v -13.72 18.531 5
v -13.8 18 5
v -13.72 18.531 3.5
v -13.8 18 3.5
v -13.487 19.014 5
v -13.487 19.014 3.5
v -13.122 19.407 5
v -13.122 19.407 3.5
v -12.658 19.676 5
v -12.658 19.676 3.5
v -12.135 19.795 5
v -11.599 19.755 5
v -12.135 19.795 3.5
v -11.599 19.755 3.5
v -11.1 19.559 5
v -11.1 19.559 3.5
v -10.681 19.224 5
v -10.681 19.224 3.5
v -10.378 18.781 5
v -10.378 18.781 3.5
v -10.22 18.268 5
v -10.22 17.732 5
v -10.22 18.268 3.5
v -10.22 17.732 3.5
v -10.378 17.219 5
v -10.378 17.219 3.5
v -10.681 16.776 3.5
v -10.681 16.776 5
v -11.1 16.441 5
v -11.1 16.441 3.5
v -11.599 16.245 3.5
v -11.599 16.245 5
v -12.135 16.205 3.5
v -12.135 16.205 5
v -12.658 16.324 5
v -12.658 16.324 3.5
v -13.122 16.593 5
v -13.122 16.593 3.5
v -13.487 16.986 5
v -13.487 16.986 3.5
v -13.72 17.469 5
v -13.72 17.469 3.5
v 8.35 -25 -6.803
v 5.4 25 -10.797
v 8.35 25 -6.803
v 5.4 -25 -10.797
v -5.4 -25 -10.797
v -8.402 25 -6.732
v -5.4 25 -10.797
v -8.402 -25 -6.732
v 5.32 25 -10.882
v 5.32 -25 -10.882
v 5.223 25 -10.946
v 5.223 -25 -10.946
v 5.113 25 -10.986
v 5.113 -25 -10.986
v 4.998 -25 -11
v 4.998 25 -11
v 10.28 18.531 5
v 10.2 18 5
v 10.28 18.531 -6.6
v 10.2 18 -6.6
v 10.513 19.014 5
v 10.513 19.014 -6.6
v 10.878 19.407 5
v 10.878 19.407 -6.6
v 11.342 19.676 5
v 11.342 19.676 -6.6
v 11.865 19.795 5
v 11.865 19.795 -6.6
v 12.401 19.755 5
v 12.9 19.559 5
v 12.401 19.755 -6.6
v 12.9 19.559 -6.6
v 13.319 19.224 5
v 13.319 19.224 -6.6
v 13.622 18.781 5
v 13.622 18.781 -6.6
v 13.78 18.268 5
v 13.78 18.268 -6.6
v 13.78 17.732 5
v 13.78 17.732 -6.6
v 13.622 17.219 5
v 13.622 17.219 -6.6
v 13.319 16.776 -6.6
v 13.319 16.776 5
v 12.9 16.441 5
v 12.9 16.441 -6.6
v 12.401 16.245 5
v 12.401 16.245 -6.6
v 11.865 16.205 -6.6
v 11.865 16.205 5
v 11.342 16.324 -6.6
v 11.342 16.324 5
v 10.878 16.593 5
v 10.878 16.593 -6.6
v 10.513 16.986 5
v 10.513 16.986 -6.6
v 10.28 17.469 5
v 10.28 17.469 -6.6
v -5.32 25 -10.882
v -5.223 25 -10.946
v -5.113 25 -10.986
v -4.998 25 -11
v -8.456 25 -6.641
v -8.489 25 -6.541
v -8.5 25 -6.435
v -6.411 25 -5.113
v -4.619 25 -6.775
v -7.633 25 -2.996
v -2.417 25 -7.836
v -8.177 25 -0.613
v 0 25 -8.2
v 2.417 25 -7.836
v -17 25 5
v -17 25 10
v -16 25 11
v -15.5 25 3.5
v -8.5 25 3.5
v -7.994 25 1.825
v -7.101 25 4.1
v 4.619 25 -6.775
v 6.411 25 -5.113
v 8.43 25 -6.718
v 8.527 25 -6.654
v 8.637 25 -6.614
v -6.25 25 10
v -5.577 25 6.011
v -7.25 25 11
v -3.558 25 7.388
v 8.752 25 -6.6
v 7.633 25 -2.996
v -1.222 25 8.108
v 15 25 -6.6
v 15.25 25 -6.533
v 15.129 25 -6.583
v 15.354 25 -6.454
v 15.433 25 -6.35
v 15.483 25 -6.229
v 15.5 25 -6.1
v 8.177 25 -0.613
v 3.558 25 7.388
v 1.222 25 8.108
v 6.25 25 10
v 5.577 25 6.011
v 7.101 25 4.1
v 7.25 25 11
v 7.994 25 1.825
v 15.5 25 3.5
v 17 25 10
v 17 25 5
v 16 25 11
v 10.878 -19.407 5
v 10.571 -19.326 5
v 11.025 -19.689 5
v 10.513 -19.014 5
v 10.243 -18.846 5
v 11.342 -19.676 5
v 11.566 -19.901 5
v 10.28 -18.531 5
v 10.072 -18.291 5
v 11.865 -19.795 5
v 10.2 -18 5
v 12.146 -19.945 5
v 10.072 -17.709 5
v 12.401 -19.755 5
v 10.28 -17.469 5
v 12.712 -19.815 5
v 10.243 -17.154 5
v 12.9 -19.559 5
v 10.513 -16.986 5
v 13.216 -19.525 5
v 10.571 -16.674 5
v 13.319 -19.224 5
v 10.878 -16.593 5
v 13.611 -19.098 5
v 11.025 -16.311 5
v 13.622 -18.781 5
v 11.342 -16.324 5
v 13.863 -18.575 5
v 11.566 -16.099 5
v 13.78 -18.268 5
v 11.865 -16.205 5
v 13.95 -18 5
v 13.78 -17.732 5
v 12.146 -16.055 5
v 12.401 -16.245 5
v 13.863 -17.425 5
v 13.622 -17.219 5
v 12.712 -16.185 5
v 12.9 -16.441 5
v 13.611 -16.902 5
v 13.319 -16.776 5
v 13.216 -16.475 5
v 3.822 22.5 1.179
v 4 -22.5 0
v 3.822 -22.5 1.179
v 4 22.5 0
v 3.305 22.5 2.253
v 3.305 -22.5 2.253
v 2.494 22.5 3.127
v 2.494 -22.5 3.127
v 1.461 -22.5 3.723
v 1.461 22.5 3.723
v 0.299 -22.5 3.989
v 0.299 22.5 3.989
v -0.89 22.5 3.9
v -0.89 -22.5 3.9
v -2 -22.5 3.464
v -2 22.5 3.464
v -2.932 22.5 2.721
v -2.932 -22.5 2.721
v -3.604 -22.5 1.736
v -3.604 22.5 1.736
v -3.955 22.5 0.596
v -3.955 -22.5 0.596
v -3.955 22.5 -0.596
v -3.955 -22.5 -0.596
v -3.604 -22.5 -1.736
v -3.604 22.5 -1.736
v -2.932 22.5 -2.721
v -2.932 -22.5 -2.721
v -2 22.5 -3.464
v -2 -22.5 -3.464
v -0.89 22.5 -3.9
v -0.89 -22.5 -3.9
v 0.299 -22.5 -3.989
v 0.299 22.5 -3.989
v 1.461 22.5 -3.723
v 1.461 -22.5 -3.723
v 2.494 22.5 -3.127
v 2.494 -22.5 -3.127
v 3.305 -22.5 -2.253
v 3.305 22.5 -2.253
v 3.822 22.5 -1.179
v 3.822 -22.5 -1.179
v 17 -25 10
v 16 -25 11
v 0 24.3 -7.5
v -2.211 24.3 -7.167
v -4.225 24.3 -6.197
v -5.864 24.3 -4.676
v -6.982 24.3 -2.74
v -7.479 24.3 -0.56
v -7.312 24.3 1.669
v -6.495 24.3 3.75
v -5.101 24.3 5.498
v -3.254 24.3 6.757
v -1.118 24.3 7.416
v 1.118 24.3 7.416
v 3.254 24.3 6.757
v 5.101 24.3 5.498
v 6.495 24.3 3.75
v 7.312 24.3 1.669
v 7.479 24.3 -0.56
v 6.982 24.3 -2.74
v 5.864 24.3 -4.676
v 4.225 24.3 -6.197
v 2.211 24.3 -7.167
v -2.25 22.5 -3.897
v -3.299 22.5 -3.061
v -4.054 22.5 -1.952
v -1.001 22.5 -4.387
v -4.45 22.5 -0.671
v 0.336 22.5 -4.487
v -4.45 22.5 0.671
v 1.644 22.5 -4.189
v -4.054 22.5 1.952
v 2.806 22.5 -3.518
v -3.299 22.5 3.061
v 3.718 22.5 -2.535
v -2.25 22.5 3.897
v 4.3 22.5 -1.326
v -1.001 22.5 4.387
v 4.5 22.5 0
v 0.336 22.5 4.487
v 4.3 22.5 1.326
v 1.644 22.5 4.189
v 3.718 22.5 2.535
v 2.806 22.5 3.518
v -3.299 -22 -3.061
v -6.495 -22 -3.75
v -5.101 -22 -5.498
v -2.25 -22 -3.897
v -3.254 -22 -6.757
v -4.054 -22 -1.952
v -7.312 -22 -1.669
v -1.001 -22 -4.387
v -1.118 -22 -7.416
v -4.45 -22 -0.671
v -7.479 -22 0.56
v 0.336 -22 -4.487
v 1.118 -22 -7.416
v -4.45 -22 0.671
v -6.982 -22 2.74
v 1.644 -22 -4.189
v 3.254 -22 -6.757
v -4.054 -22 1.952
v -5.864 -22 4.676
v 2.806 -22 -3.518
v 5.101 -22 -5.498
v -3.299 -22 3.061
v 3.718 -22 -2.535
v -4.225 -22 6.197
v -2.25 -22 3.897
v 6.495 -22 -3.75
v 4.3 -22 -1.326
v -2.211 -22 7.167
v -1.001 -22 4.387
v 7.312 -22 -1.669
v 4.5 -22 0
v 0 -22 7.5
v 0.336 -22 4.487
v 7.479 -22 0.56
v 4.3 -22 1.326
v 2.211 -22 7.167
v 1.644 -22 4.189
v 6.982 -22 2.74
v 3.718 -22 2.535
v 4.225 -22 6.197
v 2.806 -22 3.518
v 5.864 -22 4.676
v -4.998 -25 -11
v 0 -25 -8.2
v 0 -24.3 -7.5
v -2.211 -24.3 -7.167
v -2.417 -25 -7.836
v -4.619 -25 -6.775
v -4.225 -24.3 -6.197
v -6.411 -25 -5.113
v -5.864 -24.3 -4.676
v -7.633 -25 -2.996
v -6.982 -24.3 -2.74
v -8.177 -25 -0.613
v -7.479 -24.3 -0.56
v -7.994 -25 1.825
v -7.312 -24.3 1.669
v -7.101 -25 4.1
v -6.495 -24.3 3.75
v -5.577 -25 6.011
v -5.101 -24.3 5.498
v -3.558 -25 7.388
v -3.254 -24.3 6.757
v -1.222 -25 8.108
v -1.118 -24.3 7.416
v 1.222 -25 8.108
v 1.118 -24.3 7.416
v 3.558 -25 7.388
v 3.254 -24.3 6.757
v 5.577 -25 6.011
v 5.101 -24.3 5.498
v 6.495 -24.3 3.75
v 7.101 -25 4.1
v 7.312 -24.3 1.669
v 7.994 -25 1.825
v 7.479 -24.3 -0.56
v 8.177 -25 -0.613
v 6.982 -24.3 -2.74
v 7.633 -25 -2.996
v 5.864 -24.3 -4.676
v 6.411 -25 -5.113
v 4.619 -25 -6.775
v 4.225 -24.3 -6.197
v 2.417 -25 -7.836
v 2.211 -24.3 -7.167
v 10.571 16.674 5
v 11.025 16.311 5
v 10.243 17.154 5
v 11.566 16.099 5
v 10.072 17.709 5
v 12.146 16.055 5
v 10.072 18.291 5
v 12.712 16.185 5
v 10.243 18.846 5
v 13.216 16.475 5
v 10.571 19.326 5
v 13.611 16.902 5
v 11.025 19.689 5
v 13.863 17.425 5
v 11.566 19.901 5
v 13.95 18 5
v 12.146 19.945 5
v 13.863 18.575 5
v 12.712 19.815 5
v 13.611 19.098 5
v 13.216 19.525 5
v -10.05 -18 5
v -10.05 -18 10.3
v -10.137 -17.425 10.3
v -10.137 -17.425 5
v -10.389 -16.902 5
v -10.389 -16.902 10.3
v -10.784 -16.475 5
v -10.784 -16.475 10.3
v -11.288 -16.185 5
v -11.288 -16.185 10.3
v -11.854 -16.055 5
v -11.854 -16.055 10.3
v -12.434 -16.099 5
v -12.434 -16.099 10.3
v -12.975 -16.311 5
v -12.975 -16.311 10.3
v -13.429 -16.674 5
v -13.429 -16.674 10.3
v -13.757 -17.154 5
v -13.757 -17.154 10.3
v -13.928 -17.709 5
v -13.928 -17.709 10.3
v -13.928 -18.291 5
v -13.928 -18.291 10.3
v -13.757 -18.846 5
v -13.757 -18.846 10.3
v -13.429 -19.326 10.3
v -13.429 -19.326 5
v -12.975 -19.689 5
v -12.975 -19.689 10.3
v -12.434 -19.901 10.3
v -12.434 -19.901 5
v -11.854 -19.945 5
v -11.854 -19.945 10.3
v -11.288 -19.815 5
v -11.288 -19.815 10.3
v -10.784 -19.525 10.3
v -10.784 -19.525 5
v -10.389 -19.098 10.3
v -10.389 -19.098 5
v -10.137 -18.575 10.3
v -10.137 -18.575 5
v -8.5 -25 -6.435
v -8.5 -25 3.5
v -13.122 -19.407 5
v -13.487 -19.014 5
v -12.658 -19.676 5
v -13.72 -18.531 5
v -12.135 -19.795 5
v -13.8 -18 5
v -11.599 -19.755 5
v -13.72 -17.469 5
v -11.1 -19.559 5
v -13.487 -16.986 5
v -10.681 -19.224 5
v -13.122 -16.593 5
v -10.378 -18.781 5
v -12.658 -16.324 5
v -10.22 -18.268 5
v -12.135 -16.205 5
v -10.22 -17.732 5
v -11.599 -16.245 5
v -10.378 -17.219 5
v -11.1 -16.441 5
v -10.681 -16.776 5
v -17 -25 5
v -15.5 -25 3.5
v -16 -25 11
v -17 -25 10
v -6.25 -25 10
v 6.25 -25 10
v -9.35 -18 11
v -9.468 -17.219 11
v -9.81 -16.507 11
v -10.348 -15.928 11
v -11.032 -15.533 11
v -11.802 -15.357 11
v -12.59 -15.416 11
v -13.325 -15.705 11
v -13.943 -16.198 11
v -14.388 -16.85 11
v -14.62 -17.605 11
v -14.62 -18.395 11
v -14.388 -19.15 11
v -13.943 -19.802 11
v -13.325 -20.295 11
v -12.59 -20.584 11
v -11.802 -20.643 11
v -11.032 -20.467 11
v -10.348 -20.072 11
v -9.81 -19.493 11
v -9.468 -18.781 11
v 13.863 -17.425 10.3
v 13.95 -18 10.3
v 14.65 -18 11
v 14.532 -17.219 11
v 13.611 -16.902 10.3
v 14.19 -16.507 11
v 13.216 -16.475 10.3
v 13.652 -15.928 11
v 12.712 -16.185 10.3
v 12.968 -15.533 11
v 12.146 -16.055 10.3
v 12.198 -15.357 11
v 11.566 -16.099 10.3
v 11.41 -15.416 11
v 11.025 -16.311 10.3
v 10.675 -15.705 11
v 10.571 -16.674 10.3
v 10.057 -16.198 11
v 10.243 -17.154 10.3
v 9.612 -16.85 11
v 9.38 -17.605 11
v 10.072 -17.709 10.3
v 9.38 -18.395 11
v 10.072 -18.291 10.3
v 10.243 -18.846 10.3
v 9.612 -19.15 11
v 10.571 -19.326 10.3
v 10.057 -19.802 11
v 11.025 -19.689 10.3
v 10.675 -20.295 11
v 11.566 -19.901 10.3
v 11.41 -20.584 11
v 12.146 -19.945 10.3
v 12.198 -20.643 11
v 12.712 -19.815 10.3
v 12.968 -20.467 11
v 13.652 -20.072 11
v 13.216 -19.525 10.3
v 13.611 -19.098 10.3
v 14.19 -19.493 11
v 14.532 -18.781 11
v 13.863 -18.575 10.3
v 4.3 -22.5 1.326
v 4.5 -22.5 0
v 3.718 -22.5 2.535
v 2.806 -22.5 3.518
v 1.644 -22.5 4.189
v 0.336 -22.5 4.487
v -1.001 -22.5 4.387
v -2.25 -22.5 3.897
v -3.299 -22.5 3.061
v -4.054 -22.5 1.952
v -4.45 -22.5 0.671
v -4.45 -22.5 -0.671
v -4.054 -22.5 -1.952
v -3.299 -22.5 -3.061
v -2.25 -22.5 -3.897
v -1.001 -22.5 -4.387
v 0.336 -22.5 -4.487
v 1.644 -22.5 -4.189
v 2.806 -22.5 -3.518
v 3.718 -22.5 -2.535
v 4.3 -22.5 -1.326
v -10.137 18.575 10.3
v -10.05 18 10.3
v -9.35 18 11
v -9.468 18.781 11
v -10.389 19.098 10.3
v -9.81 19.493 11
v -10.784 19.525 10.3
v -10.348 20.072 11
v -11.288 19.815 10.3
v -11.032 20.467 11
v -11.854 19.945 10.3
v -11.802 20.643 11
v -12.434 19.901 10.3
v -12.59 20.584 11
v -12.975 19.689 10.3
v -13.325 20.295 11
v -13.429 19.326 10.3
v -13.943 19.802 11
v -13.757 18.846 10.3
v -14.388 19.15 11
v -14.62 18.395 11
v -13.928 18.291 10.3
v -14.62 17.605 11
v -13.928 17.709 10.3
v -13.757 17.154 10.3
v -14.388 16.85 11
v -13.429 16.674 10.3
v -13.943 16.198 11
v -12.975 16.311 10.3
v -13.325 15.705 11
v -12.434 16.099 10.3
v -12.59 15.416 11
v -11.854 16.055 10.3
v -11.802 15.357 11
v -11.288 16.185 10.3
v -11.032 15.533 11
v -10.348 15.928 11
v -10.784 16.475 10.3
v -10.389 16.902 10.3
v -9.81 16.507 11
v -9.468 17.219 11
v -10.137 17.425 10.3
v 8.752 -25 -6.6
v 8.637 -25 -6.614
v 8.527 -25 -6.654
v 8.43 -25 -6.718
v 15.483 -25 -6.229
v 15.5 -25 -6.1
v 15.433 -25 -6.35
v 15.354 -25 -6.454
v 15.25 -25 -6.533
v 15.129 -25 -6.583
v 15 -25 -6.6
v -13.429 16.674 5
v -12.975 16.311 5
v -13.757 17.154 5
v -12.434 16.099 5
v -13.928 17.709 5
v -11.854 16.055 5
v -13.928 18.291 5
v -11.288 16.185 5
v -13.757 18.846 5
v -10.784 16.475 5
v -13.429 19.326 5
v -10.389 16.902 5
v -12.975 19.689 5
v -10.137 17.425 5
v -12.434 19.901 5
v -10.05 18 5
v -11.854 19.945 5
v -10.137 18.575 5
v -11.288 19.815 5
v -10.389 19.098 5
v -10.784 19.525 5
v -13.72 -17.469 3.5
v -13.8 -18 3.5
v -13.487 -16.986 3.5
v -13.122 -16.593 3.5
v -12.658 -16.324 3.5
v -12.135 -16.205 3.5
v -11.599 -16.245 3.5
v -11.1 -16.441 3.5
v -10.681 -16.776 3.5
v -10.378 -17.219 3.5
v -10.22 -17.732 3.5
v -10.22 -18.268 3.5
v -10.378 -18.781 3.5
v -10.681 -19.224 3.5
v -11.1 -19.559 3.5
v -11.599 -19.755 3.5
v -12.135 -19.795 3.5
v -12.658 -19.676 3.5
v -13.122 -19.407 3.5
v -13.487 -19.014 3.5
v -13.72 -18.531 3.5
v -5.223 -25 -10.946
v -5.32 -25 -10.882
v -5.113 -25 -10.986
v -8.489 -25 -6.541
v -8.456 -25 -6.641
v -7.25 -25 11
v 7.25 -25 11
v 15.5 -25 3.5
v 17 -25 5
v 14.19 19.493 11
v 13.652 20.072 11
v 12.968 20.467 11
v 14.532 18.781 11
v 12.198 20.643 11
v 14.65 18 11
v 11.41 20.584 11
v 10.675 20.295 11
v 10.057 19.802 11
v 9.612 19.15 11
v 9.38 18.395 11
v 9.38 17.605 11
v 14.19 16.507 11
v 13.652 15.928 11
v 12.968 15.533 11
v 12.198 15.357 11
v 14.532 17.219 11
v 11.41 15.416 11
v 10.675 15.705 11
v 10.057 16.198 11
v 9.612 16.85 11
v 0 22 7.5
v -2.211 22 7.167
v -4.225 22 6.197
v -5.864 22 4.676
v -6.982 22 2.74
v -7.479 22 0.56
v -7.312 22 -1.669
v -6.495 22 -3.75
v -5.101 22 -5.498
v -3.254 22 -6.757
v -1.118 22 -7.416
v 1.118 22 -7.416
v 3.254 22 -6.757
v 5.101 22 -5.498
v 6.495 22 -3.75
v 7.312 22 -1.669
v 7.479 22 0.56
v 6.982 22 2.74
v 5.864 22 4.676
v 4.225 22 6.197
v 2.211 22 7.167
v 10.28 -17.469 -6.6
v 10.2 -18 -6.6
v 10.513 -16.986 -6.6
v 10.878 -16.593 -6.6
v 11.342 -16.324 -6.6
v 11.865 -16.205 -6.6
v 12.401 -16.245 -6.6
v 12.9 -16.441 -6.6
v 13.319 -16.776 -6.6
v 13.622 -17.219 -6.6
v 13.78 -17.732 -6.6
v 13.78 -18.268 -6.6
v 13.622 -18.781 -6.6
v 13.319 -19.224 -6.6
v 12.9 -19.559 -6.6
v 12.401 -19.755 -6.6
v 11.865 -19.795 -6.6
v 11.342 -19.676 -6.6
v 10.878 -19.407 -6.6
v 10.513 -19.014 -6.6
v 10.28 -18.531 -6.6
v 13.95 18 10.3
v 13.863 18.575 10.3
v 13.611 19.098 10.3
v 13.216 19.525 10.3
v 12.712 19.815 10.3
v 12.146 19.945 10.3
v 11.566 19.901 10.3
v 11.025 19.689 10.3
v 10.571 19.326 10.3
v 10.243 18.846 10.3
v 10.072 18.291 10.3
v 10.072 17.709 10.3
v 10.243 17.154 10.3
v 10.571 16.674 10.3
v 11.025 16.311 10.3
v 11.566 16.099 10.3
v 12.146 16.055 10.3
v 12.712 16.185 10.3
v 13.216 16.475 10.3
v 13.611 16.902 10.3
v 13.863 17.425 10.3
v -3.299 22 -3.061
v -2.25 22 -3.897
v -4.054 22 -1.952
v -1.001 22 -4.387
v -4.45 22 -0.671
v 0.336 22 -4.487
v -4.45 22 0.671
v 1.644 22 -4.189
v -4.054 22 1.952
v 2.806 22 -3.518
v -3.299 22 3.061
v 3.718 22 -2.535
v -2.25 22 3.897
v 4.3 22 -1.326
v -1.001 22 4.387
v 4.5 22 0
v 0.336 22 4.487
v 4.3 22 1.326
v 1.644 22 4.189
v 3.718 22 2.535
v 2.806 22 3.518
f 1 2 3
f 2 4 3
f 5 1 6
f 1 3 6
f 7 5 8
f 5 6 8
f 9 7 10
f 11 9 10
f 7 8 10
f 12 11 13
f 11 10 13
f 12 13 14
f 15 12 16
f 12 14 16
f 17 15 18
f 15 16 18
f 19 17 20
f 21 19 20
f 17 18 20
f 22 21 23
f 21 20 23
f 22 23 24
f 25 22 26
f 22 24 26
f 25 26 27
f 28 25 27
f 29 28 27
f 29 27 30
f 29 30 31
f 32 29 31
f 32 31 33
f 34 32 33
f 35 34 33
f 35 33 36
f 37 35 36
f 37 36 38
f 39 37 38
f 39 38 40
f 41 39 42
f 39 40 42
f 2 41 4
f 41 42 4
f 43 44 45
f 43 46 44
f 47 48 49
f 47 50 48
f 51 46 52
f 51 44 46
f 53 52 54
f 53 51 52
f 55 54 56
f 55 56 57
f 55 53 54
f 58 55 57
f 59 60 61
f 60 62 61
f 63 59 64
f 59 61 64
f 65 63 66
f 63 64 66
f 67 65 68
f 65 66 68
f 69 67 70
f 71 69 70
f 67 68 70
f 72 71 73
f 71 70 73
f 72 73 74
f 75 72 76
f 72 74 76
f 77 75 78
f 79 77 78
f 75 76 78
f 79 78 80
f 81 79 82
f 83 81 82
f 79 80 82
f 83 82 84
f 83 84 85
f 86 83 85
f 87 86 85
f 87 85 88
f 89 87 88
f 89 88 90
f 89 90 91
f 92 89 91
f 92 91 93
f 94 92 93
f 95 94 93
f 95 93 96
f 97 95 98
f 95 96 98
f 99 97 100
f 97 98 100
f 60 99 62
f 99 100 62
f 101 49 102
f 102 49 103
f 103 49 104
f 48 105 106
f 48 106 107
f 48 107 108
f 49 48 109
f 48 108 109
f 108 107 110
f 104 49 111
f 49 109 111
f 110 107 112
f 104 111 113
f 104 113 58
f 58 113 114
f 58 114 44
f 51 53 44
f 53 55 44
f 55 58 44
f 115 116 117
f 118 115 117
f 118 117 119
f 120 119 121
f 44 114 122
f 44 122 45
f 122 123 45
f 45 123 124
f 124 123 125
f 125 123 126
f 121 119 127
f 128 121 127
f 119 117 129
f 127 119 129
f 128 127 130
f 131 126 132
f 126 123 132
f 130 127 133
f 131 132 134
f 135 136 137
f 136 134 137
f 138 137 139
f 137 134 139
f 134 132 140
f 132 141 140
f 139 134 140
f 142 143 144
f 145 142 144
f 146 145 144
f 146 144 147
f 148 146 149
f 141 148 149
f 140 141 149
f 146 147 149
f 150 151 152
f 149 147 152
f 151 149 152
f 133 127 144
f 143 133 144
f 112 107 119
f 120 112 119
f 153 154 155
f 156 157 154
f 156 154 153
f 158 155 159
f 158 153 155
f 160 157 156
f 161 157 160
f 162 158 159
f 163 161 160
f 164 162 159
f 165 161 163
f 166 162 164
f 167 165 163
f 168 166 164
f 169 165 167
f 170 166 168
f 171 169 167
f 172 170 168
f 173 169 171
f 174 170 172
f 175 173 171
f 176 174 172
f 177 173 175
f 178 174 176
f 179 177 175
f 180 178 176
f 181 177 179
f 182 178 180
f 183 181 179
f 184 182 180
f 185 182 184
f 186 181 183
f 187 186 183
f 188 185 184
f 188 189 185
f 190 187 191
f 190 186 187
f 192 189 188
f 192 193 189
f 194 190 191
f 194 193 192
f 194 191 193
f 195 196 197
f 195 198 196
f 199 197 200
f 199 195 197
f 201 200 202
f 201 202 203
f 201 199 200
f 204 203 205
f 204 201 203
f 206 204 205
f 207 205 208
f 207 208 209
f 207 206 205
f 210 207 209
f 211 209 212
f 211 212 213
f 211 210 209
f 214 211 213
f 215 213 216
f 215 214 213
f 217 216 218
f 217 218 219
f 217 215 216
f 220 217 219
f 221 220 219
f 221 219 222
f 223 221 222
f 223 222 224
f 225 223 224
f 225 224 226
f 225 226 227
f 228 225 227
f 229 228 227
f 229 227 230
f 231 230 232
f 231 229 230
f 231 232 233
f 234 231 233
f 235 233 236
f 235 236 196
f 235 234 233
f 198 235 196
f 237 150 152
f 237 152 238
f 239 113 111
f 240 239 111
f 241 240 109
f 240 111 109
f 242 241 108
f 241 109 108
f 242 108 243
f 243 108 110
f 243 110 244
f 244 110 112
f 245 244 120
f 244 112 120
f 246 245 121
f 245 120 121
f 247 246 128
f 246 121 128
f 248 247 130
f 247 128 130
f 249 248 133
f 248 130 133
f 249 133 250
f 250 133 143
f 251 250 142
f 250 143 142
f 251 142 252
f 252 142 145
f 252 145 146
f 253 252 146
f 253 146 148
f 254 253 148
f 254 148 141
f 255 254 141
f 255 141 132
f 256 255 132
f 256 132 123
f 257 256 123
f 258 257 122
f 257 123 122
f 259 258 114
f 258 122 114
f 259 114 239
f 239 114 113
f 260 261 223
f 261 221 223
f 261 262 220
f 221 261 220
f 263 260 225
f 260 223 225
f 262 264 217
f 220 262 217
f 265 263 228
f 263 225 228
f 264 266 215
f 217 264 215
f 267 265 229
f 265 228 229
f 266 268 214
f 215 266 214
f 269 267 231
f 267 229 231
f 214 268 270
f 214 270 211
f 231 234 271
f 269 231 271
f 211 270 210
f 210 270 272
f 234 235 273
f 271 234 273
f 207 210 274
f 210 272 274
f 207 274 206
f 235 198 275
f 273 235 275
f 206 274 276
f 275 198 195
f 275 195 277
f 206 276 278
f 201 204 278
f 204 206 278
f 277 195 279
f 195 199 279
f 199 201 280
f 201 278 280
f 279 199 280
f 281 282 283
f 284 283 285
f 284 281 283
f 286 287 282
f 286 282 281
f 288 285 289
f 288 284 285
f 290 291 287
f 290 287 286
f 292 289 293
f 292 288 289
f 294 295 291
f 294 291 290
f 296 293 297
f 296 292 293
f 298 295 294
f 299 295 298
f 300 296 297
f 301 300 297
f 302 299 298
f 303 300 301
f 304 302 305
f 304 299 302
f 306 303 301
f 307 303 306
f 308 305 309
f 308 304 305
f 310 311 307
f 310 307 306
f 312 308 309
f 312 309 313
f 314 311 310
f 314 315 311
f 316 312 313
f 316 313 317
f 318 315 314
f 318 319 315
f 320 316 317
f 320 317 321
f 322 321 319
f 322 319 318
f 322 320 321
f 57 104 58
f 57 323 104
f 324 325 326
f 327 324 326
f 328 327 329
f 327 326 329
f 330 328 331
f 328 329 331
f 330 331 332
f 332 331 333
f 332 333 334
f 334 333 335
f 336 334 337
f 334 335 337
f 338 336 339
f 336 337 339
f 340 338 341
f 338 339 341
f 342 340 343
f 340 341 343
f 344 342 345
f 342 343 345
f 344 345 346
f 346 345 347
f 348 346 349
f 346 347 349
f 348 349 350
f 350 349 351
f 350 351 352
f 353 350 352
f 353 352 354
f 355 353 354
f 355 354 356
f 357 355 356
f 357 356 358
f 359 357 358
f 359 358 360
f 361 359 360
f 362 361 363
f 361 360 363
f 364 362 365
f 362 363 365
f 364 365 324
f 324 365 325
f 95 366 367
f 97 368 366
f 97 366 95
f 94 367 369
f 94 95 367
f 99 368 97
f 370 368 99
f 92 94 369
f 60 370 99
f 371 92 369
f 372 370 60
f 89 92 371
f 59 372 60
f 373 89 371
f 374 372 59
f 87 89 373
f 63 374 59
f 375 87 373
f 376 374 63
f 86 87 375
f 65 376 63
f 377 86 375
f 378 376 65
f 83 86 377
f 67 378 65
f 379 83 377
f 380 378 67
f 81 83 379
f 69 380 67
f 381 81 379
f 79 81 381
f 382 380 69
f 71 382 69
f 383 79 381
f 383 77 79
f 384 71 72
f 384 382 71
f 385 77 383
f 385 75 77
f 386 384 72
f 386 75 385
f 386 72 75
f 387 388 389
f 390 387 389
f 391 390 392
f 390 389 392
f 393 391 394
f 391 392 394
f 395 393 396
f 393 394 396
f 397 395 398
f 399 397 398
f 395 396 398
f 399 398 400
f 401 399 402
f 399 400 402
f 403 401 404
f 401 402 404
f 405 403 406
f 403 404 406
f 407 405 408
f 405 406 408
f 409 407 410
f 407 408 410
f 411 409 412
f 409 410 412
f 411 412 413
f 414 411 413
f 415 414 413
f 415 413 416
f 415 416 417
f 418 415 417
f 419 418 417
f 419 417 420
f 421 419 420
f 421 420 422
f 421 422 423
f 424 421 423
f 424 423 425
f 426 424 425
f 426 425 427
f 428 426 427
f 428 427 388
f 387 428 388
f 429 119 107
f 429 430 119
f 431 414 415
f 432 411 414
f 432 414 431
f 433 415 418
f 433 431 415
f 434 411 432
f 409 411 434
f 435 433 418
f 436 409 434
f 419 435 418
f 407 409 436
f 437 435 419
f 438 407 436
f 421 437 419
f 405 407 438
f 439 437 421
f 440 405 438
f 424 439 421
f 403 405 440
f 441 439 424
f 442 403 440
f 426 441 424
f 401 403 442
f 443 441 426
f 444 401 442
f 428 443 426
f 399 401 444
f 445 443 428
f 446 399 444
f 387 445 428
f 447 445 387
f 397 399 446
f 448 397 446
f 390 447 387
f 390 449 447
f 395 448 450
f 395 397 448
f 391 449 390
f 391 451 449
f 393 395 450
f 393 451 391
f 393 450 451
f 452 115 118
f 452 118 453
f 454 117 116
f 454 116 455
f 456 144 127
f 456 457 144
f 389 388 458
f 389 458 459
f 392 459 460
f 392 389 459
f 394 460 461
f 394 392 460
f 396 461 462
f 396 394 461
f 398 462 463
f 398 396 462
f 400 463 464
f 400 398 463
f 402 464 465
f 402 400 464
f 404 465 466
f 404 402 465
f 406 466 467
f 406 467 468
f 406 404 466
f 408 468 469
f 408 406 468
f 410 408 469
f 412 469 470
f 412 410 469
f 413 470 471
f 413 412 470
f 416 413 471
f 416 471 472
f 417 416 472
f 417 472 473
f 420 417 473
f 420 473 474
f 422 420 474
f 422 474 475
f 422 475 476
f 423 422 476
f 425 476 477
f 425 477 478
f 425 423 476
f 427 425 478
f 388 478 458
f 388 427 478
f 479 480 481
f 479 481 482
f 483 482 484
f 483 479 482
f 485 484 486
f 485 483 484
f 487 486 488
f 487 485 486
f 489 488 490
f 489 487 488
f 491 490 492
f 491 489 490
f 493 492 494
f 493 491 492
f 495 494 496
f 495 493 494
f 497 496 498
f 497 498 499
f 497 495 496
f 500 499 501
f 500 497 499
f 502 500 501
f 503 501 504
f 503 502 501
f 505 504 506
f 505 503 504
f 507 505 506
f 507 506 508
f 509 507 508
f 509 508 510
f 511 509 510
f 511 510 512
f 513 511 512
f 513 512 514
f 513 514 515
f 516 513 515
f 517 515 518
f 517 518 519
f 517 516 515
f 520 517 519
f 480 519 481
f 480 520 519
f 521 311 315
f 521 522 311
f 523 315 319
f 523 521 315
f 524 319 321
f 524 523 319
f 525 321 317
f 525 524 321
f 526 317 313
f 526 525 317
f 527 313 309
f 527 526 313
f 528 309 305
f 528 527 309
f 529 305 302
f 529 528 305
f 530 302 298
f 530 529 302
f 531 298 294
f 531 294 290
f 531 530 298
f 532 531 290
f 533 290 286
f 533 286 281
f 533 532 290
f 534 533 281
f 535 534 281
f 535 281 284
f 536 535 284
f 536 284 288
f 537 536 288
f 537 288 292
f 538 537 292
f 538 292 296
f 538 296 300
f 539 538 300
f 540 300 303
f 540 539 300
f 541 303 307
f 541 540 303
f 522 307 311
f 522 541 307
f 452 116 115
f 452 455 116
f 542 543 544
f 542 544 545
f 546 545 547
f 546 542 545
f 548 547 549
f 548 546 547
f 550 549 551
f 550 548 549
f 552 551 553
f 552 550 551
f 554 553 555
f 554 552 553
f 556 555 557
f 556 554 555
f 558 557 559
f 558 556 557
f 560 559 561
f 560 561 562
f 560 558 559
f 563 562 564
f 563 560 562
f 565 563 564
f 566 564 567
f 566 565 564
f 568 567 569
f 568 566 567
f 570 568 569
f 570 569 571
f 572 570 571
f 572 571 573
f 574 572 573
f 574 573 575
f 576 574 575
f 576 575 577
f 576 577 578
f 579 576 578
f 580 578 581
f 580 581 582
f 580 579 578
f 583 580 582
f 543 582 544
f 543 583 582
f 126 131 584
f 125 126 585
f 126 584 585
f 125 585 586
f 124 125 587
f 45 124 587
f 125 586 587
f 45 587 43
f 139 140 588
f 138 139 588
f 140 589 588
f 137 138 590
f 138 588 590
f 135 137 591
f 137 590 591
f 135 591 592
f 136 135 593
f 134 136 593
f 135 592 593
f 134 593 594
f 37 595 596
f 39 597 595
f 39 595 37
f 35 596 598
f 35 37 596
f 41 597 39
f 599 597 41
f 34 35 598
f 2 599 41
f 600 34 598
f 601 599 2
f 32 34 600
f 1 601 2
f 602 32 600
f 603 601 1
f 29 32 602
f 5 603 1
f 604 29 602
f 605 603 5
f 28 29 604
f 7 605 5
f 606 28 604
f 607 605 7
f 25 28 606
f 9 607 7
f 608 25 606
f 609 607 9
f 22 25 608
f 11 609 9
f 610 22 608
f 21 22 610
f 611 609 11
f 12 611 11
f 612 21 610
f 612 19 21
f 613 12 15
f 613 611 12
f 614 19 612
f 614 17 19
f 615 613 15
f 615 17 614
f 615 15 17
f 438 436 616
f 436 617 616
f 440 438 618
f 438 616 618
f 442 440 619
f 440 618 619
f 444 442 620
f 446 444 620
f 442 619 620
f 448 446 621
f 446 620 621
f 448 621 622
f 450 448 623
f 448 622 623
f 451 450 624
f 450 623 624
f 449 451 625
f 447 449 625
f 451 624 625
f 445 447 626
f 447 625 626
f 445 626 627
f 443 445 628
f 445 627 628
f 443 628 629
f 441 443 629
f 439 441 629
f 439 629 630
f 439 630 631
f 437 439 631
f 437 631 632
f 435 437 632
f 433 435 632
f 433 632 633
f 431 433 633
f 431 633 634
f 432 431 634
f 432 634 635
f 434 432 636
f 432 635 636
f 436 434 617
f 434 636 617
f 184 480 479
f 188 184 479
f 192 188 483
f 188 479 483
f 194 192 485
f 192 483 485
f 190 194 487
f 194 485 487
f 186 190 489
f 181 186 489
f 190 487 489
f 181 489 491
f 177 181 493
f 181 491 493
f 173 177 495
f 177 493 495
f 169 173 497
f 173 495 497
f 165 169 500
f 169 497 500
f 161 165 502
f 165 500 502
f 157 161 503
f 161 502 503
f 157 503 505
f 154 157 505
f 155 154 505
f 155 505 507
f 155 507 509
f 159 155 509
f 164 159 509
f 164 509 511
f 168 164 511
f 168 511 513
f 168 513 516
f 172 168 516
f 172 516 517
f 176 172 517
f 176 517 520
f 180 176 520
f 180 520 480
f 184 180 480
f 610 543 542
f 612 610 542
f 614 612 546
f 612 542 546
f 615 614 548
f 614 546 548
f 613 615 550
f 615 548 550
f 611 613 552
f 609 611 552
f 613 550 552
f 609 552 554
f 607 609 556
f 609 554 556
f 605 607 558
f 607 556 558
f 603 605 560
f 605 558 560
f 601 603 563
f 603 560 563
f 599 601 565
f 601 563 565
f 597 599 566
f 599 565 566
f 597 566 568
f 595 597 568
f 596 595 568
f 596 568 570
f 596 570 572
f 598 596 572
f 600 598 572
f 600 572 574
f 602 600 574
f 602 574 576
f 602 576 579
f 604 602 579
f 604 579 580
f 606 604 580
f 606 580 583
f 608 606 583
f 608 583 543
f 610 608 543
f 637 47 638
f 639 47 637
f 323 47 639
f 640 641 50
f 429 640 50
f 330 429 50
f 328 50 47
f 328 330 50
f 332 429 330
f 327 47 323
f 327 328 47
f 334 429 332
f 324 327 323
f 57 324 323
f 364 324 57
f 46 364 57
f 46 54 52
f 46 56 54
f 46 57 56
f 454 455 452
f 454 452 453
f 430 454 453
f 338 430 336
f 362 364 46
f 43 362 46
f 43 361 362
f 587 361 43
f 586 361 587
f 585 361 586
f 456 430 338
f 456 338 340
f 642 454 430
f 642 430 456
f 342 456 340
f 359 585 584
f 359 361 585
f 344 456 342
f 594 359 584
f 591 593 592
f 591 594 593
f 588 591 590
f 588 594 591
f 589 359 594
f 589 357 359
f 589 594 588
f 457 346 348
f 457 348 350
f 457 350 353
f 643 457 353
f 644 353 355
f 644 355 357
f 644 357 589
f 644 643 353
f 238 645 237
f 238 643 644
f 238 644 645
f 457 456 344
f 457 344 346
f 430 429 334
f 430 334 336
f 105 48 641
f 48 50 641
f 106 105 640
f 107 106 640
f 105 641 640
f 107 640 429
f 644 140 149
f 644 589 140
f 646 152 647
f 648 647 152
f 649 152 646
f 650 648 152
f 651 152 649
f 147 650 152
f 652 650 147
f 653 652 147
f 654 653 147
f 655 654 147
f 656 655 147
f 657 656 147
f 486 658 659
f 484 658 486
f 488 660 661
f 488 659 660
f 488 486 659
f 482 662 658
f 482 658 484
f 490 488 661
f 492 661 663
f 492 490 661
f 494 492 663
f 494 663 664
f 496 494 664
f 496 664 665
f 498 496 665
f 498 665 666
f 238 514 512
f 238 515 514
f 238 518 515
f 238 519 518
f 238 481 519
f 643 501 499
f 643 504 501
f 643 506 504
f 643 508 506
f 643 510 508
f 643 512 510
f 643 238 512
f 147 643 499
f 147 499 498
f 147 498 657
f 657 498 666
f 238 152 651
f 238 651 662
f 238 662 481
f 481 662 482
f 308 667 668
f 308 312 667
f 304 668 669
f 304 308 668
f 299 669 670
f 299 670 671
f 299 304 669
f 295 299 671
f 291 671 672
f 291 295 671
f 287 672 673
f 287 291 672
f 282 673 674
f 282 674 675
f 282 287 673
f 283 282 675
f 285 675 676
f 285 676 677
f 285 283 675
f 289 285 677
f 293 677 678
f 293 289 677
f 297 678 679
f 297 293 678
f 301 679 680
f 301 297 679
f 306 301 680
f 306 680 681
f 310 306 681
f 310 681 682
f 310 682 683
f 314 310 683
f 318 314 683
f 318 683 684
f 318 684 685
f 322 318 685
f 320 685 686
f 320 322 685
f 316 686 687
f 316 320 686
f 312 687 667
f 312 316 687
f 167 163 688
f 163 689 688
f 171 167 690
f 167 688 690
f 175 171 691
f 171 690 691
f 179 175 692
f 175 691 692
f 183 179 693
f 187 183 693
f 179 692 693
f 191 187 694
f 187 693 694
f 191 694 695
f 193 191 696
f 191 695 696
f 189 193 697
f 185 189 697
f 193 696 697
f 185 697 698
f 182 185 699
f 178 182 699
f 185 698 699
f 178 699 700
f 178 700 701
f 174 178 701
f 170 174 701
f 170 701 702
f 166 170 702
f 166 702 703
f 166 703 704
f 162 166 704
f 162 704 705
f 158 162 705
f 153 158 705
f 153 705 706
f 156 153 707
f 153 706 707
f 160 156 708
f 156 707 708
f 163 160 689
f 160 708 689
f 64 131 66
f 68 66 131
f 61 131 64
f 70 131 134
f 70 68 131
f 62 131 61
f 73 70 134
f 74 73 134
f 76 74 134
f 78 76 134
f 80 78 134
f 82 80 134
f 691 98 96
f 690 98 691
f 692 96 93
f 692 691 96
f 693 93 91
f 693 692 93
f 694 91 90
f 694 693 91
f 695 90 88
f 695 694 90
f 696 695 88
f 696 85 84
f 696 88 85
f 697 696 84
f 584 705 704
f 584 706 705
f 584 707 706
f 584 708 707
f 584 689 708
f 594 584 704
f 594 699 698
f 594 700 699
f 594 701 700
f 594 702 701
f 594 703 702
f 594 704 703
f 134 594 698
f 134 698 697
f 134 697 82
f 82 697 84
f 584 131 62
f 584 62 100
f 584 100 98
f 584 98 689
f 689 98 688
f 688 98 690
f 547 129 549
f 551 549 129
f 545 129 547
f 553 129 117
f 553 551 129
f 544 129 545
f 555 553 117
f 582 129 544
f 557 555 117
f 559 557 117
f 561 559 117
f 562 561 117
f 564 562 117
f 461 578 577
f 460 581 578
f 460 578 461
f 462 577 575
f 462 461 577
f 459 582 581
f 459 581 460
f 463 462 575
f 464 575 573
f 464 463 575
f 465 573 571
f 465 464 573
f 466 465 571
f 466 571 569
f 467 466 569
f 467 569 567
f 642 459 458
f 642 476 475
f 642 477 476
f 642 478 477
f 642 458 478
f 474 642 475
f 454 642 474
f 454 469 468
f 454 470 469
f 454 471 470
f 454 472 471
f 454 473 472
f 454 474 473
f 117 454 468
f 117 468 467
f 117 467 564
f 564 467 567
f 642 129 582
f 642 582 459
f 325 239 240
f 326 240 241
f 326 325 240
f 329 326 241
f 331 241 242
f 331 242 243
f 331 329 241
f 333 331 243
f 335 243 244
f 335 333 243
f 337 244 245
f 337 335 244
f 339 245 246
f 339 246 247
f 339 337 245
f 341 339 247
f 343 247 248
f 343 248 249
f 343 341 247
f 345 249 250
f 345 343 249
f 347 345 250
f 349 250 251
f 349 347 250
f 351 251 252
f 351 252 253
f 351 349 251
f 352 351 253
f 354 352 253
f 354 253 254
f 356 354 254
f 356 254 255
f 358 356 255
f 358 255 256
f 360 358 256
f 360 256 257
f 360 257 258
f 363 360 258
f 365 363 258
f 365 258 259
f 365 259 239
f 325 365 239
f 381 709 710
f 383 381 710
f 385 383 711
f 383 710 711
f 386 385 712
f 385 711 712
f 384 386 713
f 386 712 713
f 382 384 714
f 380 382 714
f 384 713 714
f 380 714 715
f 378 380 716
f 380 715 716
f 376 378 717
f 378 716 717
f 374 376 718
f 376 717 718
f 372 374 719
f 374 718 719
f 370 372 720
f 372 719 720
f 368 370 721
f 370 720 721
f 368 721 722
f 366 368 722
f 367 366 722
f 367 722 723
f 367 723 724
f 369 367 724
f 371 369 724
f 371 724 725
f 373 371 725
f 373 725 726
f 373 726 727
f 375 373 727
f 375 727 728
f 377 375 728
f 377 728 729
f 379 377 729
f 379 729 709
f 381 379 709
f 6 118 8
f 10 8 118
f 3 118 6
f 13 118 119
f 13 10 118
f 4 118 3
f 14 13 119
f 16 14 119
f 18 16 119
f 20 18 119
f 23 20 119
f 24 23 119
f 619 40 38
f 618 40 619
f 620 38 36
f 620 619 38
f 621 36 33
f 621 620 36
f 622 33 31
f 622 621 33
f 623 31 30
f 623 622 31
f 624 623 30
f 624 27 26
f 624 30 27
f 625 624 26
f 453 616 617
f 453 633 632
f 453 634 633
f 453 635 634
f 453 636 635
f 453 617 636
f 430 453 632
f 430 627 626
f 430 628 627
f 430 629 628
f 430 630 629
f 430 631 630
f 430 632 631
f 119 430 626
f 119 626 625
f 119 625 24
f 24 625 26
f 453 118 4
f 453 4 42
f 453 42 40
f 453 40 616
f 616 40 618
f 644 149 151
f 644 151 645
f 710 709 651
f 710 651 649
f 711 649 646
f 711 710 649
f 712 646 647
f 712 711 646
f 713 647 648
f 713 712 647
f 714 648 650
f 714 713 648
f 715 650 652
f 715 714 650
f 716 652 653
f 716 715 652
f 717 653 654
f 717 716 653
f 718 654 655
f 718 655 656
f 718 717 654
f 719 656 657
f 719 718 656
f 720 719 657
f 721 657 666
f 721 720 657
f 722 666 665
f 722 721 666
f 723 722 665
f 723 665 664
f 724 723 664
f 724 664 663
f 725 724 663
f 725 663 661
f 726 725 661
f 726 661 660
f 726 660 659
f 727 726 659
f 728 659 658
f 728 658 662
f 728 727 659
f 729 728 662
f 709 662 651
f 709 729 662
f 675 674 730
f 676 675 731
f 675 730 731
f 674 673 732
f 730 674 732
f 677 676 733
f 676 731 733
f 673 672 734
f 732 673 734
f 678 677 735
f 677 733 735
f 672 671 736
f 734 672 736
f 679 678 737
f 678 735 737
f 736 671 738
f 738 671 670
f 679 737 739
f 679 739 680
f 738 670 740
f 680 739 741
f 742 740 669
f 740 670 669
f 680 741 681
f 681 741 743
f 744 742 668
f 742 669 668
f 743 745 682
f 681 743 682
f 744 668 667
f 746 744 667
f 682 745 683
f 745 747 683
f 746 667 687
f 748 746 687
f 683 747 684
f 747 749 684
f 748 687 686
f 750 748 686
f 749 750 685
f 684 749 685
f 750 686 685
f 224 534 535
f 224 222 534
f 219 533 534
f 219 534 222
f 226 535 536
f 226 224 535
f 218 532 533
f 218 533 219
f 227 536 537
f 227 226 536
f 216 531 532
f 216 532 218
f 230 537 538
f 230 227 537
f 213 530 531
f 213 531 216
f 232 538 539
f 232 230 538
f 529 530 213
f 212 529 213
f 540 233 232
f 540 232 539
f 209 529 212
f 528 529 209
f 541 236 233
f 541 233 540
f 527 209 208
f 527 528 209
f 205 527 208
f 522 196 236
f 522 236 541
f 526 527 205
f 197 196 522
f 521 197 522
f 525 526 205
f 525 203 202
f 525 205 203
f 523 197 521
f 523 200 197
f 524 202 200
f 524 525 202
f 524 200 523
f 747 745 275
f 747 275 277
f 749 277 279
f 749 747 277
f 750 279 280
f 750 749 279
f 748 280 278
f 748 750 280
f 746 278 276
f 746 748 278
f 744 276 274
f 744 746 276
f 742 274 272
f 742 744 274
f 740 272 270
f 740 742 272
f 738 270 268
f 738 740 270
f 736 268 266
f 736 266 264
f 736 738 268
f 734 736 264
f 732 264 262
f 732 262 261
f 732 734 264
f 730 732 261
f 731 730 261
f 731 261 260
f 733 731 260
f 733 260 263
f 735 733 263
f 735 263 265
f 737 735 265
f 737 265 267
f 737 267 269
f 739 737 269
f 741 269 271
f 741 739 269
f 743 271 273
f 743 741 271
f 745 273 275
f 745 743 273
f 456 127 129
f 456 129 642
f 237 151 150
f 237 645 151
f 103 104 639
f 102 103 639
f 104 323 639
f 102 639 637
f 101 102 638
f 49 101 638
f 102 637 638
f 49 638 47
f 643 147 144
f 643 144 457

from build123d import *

# Parameters (mm, degrees)
F1_DEPTH       = 25
F2_SIZE        = 0.99999
F3_SIZE        = 1.49999
F4_R           = 0.5
F6_D           = 3.6
F6_CBORE_D     = 3.9
F6_CBORE_DEPTH = 6
F7_SIZE        = 0.7
F0_R           = 4.5
F8_DEPTH       = 22
F0_R_2         = 4
F9_DEPTH       = 22.5


# Not quite as in the source:
# - a fillet or chamfer is up to 0.001 mm smaller than in the source, because OpenCascade refuses the exact size


with BuildPart() as f1:
    # F0 (on Front) → F1 (new body, symmetric)
    with BuildSketch(Plane.XZ):
        with BuildLine():
            ThreePointArc((0, 7.5), (5.3033008589, 5.3033008589), (7.5, 0))
            ThreePointArc((7.5, 0), (5.3033008589, -5.3033008589), (0, -7.5))
            Line((0, -7.5), (0, -11))
            Line((0, -11), (5.25, -11))
            Line((5.25, -11), (8.5, -6.6))
            Line((8.5, -6.6), (15.5, -6.6))
            Line((15.5, -6.6), (15.5, 3.5))
            Line((15.5, 3.5), (17, 3.5))
            Line((17, 3.5), (17, 11))
            Line((17, 11), (7.25, 11))
            Line((7.25, 11), (7.25, 10))
            Line((7.25, 10), (0, 10))
            Line((0, 10), (0, 7.5))
        make_face()
        with BuildLine():
            ThreePointArc((0, -7.5), (-7.5, 0), (0, 7.5))
            Line((0, 7.5), (0, 10))
            Line((0, 10), (-7.25, 10))
            Line((-7.25, 10), (-7.25, 11))
            Line((-7.25, 11), (-17, 11))
            Line((-17, 11), (-17, 3.5))
            Line((-17, 3.5), (-15.5, 3.5))
            Line((-15.5, 3.5), (-8.5, 3.5))
            Line((-8.5, 3.5), (-8.5, -6.6))
            Line((-8.5, -6.6), (-5.25, -11))
            Line((-5.25, -11), (0, -11))
            Line((0, -11), (0, -7.5))
        make_face()
    extrude(amount=F1_DEPTH, both=True)

    # F2 (size 1 in the source; OpenCascade refuses exactly that, so slightly less here)
    f2_edges = [f1.edges().sort_by_distance(p)[0] for p in [
        (7.25, 0, 10),
        (17, 0, 11),
        (-7.25, 0, 10),
        (-17, 0, 11),
    ]]
    chamfer(f2_edges, length=F2_SIZE)

    # F3 (size 1.5 in the source; OpenCascade refuses exactly that, so slightly less here)
    f3_edges = [f1.edges().sort_by_distance(p)[0] for p in [
        (17, 0, 3.5),
        (-17, 0, 3.5),
    ]]
    chamfer(f3_edges, length=F3_SIZE)

    # F4
    f4_edges = [f1.edges().sort_by_distance(p)[0] for p in [
        (15.5, 0, -6.6),
        (8.5, 0, -6.6),
        (5.25, 0, -11),
        (-5.25, 0, -11),
        (-8.5, 0, -6.6),
    ]]
    fillet(f4_edges, radius=F4_R)

    # F6 (through all)
    with Locations(Plane.XY.offset(11)):
        with Locations((12, 18), (12, -18), (-12, 18), (-12, -18)):
            CounterBoreHole(F6_D / 2, F6_CBORE_D / 2, F6_CBORE_DEPTH)

    # F7
    f7_edges = [f1.edges().sort_by_distance(p)[0] for p in [
        (-7.5, -25, 0),
        (-7.5, 25, 0),
        (10.05, 18, 11),
        (10.05, -18, 11),
        (-13.95, 18, 11),
        (-13.95, -18, 11),
    ]]
    chamfer(f7_edges, length=F7_SIZE)


with BuildPart() as f8:
    # F0 (on Front) → F8 (new body, symmetric)
    with BuildSketch(Plane.XZ):
        with BuildLine():
            ThreePointArc((0, -7.5), (5.3033008589, -5.3033008589), (7.5, 0))
            ThreePointArc((7.5, 0), (5.3033008589, 5.3033008589), (0, 7.5))
            ThreePointArc((0, 7.5), (-7.5, 0), (0, -7.5))
        make_face()
        Circle(F0_R, mode=Mode.SUBTRACT)
    extrude(amount=F8_DEPTH, both=True)

    # F0 (on Front) → F9 (join, symmetric)
    with BuildSketch(Plane.XZ):
        Circle(F0_R)
        Circle(F0_R_2, mode=Mode.SUBTRACT)
    extrude(amount=F9_DEPTH, both=True)


solid = Compound([f1.part, f8.part])
